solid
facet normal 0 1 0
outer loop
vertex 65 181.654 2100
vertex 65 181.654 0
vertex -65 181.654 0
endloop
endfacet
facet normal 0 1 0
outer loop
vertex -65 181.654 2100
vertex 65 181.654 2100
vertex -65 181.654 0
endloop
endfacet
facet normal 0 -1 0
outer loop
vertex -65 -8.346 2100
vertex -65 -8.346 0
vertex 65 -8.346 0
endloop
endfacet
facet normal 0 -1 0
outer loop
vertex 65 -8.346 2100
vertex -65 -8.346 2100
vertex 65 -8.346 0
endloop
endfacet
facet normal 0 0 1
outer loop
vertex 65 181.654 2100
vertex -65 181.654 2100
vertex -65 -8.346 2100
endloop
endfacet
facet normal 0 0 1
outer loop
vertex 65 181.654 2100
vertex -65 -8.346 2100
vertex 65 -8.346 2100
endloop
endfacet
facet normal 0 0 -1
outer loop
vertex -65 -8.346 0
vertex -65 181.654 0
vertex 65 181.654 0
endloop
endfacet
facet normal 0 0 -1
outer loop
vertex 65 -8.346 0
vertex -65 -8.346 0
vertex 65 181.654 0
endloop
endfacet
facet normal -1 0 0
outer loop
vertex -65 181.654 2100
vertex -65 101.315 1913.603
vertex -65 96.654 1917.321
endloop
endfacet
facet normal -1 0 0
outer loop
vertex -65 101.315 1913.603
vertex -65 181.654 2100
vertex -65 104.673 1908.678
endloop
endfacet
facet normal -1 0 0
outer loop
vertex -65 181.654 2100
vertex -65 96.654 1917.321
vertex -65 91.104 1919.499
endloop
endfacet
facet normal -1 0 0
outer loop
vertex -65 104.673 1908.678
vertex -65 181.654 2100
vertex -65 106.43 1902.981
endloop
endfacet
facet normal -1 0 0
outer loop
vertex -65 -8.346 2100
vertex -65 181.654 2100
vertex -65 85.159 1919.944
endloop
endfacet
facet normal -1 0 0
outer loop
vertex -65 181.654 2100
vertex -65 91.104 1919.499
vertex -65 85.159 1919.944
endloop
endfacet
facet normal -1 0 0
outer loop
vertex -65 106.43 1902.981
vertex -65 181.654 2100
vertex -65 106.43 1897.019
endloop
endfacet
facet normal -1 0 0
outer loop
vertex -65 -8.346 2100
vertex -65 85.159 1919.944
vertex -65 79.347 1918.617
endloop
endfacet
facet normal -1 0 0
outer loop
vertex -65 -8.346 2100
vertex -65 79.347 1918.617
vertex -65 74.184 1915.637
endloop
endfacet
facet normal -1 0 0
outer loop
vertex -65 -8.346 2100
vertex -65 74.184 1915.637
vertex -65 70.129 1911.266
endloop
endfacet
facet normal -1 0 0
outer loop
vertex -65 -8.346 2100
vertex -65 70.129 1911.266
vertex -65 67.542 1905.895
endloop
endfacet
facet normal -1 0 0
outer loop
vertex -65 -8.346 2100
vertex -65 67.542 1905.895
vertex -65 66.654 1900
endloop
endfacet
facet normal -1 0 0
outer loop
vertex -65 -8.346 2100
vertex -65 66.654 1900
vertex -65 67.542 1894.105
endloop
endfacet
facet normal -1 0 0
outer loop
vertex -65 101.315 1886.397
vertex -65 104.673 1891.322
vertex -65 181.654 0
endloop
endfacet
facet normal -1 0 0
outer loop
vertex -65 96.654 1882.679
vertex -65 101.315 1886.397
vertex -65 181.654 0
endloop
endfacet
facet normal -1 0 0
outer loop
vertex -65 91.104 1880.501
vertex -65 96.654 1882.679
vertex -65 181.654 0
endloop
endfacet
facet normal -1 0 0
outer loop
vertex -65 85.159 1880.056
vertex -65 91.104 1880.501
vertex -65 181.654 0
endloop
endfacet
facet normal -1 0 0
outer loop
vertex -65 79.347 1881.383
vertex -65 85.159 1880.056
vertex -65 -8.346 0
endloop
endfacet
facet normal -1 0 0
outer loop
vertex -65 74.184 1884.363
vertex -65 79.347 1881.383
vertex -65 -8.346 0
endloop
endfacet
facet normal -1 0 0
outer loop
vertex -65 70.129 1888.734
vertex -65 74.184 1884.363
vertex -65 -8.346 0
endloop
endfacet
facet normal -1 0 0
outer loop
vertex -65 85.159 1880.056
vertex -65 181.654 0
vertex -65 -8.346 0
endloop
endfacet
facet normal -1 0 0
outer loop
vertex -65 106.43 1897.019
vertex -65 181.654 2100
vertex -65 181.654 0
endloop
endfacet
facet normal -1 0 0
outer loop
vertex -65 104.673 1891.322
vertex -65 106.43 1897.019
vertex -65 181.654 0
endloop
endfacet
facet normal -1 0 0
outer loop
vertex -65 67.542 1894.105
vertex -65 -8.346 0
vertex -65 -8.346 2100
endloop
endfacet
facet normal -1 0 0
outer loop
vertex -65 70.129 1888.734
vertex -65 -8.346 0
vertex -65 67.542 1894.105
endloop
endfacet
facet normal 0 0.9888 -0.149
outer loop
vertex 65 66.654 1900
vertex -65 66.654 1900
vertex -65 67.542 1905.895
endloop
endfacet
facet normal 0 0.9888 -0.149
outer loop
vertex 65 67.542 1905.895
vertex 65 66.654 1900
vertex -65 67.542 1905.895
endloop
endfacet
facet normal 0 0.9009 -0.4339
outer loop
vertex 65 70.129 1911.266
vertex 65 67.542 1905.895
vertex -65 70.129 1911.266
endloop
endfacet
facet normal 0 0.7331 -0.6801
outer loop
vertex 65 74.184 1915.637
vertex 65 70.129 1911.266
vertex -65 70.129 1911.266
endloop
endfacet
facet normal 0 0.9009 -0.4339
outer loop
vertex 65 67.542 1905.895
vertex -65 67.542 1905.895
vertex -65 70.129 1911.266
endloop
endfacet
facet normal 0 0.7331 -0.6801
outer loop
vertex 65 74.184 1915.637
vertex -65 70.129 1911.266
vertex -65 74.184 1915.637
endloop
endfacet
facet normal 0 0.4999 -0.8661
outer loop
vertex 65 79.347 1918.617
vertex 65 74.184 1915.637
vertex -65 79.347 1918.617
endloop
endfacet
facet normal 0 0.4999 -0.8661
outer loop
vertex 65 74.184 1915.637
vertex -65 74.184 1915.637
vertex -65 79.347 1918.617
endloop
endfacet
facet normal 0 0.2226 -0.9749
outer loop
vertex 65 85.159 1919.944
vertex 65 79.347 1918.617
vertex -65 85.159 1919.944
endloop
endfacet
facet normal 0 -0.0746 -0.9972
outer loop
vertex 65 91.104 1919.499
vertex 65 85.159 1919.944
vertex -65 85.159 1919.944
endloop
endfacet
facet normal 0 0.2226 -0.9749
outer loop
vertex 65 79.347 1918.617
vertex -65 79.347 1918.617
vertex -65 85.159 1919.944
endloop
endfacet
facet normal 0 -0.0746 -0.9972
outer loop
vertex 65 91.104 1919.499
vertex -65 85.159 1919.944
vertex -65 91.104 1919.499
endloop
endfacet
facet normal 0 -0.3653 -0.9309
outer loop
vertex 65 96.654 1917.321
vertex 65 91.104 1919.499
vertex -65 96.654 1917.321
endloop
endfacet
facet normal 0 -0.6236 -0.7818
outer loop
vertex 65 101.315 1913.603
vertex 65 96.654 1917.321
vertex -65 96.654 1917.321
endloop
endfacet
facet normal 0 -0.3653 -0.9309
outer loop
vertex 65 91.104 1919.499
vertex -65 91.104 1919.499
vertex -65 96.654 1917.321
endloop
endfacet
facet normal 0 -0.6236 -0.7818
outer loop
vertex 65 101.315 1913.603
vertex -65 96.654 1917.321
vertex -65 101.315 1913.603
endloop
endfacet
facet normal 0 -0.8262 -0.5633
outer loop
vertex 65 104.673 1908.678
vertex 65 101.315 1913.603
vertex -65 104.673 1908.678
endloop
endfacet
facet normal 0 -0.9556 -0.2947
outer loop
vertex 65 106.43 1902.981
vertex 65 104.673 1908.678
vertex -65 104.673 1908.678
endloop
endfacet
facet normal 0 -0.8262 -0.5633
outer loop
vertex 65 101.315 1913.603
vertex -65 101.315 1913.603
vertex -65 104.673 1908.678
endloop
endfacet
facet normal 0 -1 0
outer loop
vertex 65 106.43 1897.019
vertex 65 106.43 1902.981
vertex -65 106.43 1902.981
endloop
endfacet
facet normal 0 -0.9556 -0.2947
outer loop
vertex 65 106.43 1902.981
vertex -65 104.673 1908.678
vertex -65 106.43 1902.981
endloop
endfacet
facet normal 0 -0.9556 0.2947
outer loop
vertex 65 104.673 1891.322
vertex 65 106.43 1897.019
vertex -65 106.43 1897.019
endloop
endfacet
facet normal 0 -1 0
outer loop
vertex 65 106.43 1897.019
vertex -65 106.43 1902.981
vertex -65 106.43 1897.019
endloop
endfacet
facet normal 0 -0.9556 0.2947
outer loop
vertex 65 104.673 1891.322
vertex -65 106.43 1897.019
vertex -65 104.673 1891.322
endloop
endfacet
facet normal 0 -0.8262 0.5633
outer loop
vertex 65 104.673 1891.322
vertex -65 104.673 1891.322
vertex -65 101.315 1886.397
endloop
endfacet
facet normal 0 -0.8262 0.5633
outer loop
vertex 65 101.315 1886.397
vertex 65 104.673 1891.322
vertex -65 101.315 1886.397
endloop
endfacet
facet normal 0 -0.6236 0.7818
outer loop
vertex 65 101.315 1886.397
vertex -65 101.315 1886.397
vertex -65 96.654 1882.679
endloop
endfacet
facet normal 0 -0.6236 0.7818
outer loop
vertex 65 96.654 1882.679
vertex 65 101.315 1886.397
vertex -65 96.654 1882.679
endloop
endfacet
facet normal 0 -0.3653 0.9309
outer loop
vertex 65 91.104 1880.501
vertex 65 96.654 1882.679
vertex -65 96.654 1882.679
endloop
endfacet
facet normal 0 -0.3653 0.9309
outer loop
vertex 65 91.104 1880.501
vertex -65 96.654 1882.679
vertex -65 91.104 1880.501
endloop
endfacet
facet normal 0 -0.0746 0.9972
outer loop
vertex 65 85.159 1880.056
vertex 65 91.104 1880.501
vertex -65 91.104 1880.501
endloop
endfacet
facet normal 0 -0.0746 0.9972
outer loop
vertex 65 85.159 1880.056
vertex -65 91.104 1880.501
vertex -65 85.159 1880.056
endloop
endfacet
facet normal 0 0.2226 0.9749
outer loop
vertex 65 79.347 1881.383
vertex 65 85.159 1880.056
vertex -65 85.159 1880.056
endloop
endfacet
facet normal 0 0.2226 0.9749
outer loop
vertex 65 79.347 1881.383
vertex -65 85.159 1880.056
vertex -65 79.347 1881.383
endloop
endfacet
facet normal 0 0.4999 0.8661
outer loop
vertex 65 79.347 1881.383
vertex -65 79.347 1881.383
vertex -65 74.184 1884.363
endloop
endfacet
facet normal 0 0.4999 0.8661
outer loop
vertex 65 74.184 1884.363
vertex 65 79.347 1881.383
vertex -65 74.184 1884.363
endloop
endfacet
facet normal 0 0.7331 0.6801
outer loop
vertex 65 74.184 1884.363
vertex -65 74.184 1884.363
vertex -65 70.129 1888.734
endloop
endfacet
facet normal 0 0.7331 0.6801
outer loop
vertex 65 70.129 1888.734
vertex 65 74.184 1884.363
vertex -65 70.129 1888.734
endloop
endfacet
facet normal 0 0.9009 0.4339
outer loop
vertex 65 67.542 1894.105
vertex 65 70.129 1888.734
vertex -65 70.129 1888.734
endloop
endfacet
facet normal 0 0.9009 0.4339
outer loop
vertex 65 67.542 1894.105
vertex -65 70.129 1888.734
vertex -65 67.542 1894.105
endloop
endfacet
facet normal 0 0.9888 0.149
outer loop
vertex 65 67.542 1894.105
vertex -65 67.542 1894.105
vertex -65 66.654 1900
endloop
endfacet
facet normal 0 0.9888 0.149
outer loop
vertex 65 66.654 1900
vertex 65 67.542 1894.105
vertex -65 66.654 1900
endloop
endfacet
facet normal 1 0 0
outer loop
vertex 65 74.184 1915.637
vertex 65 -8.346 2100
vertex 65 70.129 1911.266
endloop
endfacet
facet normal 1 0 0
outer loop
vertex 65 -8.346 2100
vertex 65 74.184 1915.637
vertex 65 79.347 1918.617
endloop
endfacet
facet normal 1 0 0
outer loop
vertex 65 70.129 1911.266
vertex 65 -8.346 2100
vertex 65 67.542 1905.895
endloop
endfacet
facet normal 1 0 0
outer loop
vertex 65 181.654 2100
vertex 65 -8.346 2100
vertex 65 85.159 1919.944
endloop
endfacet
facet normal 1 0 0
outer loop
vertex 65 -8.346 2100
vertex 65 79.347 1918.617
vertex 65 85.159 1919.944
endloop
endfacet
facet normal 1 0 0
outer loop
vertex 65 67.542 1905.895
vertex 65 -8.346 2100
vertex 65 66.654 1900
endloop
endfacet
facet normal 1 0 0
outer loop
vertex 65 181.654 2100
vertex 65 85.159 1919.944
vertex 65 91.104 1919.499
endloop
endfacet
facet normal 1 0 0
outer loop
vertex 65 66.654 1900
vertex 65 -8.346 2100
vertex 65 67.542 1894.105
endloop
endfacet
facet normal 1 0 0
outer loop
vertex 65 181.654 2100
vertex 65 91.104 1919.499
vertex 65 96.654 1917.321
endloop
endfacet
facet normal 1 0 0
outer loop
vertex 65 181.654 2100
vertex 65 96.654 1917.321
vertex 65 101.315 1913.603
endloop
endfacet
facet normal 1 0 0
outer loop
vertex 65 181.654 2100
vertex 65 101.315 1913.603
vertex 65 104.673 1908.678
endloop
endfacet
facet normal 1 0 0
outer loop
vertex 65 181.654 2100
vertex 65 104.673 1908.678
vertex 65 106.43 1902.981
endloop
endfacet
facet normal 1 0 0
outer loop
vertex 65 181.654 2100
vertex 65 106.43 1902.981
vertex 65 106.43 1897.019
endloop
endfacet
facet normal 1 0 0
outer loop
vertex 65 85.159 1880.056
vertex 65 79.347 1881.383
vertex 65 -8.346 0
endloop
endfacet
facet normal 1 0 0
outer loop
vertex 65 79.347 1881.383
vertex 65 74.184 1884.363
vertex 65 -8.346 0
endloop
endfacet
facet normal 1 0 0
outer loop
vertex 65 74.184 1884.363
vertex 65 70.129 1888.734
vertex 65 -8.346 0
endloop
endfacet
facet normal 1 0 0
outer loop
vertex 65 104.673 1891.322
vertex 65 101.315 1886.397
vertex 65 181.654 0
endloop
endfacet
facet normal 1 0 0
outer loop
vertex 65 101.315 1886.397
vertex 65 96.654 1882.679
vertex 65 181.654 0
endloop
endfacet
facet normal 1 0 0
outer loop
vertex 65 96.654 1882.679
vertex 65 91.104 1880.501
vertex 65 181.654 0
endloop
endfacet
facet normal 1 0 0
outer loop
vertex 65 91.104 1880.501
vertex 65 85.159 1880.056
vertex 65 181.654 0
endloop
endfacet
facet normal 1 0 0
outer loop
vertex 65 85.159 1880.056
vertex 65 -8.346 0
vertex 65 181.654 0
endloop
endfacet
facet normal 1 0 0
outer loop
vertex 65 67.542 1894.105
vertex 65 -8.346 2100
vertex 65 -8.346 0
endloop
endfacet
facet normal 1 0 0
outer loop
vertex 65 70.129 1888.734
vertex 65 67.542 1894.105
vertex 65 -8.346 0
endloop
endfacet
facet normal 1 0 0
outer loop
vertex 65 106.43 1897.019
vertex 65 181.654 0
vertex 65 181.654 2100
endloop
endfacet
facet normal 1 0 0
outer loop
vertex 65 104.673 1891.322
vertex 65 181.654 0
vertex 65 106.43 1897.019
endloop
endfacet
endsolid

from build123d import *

# Parameters (mm, degrees)
F1_DEPTH = 2100
F3_D     = 40


with BuildPart() as f1:
    # F0 (on Top) → F1 (new body)
    with BuildSketch(Plane.XY):
        Polygon((-34.255523, 181.653569), (-65, 181.653569), (-65, -8.346431), (65, -8.346431), (65, 181.653569), (34.255523, 181.653569), align=None)
    extrude(amount=F1_DEPTH)

    # F3 (through all)
    with Locations(Plane.YZ.offset(65)):
        with Locations((86.653569, 1900)):
            Hole(F3_D / 2)


solid = f1.part
